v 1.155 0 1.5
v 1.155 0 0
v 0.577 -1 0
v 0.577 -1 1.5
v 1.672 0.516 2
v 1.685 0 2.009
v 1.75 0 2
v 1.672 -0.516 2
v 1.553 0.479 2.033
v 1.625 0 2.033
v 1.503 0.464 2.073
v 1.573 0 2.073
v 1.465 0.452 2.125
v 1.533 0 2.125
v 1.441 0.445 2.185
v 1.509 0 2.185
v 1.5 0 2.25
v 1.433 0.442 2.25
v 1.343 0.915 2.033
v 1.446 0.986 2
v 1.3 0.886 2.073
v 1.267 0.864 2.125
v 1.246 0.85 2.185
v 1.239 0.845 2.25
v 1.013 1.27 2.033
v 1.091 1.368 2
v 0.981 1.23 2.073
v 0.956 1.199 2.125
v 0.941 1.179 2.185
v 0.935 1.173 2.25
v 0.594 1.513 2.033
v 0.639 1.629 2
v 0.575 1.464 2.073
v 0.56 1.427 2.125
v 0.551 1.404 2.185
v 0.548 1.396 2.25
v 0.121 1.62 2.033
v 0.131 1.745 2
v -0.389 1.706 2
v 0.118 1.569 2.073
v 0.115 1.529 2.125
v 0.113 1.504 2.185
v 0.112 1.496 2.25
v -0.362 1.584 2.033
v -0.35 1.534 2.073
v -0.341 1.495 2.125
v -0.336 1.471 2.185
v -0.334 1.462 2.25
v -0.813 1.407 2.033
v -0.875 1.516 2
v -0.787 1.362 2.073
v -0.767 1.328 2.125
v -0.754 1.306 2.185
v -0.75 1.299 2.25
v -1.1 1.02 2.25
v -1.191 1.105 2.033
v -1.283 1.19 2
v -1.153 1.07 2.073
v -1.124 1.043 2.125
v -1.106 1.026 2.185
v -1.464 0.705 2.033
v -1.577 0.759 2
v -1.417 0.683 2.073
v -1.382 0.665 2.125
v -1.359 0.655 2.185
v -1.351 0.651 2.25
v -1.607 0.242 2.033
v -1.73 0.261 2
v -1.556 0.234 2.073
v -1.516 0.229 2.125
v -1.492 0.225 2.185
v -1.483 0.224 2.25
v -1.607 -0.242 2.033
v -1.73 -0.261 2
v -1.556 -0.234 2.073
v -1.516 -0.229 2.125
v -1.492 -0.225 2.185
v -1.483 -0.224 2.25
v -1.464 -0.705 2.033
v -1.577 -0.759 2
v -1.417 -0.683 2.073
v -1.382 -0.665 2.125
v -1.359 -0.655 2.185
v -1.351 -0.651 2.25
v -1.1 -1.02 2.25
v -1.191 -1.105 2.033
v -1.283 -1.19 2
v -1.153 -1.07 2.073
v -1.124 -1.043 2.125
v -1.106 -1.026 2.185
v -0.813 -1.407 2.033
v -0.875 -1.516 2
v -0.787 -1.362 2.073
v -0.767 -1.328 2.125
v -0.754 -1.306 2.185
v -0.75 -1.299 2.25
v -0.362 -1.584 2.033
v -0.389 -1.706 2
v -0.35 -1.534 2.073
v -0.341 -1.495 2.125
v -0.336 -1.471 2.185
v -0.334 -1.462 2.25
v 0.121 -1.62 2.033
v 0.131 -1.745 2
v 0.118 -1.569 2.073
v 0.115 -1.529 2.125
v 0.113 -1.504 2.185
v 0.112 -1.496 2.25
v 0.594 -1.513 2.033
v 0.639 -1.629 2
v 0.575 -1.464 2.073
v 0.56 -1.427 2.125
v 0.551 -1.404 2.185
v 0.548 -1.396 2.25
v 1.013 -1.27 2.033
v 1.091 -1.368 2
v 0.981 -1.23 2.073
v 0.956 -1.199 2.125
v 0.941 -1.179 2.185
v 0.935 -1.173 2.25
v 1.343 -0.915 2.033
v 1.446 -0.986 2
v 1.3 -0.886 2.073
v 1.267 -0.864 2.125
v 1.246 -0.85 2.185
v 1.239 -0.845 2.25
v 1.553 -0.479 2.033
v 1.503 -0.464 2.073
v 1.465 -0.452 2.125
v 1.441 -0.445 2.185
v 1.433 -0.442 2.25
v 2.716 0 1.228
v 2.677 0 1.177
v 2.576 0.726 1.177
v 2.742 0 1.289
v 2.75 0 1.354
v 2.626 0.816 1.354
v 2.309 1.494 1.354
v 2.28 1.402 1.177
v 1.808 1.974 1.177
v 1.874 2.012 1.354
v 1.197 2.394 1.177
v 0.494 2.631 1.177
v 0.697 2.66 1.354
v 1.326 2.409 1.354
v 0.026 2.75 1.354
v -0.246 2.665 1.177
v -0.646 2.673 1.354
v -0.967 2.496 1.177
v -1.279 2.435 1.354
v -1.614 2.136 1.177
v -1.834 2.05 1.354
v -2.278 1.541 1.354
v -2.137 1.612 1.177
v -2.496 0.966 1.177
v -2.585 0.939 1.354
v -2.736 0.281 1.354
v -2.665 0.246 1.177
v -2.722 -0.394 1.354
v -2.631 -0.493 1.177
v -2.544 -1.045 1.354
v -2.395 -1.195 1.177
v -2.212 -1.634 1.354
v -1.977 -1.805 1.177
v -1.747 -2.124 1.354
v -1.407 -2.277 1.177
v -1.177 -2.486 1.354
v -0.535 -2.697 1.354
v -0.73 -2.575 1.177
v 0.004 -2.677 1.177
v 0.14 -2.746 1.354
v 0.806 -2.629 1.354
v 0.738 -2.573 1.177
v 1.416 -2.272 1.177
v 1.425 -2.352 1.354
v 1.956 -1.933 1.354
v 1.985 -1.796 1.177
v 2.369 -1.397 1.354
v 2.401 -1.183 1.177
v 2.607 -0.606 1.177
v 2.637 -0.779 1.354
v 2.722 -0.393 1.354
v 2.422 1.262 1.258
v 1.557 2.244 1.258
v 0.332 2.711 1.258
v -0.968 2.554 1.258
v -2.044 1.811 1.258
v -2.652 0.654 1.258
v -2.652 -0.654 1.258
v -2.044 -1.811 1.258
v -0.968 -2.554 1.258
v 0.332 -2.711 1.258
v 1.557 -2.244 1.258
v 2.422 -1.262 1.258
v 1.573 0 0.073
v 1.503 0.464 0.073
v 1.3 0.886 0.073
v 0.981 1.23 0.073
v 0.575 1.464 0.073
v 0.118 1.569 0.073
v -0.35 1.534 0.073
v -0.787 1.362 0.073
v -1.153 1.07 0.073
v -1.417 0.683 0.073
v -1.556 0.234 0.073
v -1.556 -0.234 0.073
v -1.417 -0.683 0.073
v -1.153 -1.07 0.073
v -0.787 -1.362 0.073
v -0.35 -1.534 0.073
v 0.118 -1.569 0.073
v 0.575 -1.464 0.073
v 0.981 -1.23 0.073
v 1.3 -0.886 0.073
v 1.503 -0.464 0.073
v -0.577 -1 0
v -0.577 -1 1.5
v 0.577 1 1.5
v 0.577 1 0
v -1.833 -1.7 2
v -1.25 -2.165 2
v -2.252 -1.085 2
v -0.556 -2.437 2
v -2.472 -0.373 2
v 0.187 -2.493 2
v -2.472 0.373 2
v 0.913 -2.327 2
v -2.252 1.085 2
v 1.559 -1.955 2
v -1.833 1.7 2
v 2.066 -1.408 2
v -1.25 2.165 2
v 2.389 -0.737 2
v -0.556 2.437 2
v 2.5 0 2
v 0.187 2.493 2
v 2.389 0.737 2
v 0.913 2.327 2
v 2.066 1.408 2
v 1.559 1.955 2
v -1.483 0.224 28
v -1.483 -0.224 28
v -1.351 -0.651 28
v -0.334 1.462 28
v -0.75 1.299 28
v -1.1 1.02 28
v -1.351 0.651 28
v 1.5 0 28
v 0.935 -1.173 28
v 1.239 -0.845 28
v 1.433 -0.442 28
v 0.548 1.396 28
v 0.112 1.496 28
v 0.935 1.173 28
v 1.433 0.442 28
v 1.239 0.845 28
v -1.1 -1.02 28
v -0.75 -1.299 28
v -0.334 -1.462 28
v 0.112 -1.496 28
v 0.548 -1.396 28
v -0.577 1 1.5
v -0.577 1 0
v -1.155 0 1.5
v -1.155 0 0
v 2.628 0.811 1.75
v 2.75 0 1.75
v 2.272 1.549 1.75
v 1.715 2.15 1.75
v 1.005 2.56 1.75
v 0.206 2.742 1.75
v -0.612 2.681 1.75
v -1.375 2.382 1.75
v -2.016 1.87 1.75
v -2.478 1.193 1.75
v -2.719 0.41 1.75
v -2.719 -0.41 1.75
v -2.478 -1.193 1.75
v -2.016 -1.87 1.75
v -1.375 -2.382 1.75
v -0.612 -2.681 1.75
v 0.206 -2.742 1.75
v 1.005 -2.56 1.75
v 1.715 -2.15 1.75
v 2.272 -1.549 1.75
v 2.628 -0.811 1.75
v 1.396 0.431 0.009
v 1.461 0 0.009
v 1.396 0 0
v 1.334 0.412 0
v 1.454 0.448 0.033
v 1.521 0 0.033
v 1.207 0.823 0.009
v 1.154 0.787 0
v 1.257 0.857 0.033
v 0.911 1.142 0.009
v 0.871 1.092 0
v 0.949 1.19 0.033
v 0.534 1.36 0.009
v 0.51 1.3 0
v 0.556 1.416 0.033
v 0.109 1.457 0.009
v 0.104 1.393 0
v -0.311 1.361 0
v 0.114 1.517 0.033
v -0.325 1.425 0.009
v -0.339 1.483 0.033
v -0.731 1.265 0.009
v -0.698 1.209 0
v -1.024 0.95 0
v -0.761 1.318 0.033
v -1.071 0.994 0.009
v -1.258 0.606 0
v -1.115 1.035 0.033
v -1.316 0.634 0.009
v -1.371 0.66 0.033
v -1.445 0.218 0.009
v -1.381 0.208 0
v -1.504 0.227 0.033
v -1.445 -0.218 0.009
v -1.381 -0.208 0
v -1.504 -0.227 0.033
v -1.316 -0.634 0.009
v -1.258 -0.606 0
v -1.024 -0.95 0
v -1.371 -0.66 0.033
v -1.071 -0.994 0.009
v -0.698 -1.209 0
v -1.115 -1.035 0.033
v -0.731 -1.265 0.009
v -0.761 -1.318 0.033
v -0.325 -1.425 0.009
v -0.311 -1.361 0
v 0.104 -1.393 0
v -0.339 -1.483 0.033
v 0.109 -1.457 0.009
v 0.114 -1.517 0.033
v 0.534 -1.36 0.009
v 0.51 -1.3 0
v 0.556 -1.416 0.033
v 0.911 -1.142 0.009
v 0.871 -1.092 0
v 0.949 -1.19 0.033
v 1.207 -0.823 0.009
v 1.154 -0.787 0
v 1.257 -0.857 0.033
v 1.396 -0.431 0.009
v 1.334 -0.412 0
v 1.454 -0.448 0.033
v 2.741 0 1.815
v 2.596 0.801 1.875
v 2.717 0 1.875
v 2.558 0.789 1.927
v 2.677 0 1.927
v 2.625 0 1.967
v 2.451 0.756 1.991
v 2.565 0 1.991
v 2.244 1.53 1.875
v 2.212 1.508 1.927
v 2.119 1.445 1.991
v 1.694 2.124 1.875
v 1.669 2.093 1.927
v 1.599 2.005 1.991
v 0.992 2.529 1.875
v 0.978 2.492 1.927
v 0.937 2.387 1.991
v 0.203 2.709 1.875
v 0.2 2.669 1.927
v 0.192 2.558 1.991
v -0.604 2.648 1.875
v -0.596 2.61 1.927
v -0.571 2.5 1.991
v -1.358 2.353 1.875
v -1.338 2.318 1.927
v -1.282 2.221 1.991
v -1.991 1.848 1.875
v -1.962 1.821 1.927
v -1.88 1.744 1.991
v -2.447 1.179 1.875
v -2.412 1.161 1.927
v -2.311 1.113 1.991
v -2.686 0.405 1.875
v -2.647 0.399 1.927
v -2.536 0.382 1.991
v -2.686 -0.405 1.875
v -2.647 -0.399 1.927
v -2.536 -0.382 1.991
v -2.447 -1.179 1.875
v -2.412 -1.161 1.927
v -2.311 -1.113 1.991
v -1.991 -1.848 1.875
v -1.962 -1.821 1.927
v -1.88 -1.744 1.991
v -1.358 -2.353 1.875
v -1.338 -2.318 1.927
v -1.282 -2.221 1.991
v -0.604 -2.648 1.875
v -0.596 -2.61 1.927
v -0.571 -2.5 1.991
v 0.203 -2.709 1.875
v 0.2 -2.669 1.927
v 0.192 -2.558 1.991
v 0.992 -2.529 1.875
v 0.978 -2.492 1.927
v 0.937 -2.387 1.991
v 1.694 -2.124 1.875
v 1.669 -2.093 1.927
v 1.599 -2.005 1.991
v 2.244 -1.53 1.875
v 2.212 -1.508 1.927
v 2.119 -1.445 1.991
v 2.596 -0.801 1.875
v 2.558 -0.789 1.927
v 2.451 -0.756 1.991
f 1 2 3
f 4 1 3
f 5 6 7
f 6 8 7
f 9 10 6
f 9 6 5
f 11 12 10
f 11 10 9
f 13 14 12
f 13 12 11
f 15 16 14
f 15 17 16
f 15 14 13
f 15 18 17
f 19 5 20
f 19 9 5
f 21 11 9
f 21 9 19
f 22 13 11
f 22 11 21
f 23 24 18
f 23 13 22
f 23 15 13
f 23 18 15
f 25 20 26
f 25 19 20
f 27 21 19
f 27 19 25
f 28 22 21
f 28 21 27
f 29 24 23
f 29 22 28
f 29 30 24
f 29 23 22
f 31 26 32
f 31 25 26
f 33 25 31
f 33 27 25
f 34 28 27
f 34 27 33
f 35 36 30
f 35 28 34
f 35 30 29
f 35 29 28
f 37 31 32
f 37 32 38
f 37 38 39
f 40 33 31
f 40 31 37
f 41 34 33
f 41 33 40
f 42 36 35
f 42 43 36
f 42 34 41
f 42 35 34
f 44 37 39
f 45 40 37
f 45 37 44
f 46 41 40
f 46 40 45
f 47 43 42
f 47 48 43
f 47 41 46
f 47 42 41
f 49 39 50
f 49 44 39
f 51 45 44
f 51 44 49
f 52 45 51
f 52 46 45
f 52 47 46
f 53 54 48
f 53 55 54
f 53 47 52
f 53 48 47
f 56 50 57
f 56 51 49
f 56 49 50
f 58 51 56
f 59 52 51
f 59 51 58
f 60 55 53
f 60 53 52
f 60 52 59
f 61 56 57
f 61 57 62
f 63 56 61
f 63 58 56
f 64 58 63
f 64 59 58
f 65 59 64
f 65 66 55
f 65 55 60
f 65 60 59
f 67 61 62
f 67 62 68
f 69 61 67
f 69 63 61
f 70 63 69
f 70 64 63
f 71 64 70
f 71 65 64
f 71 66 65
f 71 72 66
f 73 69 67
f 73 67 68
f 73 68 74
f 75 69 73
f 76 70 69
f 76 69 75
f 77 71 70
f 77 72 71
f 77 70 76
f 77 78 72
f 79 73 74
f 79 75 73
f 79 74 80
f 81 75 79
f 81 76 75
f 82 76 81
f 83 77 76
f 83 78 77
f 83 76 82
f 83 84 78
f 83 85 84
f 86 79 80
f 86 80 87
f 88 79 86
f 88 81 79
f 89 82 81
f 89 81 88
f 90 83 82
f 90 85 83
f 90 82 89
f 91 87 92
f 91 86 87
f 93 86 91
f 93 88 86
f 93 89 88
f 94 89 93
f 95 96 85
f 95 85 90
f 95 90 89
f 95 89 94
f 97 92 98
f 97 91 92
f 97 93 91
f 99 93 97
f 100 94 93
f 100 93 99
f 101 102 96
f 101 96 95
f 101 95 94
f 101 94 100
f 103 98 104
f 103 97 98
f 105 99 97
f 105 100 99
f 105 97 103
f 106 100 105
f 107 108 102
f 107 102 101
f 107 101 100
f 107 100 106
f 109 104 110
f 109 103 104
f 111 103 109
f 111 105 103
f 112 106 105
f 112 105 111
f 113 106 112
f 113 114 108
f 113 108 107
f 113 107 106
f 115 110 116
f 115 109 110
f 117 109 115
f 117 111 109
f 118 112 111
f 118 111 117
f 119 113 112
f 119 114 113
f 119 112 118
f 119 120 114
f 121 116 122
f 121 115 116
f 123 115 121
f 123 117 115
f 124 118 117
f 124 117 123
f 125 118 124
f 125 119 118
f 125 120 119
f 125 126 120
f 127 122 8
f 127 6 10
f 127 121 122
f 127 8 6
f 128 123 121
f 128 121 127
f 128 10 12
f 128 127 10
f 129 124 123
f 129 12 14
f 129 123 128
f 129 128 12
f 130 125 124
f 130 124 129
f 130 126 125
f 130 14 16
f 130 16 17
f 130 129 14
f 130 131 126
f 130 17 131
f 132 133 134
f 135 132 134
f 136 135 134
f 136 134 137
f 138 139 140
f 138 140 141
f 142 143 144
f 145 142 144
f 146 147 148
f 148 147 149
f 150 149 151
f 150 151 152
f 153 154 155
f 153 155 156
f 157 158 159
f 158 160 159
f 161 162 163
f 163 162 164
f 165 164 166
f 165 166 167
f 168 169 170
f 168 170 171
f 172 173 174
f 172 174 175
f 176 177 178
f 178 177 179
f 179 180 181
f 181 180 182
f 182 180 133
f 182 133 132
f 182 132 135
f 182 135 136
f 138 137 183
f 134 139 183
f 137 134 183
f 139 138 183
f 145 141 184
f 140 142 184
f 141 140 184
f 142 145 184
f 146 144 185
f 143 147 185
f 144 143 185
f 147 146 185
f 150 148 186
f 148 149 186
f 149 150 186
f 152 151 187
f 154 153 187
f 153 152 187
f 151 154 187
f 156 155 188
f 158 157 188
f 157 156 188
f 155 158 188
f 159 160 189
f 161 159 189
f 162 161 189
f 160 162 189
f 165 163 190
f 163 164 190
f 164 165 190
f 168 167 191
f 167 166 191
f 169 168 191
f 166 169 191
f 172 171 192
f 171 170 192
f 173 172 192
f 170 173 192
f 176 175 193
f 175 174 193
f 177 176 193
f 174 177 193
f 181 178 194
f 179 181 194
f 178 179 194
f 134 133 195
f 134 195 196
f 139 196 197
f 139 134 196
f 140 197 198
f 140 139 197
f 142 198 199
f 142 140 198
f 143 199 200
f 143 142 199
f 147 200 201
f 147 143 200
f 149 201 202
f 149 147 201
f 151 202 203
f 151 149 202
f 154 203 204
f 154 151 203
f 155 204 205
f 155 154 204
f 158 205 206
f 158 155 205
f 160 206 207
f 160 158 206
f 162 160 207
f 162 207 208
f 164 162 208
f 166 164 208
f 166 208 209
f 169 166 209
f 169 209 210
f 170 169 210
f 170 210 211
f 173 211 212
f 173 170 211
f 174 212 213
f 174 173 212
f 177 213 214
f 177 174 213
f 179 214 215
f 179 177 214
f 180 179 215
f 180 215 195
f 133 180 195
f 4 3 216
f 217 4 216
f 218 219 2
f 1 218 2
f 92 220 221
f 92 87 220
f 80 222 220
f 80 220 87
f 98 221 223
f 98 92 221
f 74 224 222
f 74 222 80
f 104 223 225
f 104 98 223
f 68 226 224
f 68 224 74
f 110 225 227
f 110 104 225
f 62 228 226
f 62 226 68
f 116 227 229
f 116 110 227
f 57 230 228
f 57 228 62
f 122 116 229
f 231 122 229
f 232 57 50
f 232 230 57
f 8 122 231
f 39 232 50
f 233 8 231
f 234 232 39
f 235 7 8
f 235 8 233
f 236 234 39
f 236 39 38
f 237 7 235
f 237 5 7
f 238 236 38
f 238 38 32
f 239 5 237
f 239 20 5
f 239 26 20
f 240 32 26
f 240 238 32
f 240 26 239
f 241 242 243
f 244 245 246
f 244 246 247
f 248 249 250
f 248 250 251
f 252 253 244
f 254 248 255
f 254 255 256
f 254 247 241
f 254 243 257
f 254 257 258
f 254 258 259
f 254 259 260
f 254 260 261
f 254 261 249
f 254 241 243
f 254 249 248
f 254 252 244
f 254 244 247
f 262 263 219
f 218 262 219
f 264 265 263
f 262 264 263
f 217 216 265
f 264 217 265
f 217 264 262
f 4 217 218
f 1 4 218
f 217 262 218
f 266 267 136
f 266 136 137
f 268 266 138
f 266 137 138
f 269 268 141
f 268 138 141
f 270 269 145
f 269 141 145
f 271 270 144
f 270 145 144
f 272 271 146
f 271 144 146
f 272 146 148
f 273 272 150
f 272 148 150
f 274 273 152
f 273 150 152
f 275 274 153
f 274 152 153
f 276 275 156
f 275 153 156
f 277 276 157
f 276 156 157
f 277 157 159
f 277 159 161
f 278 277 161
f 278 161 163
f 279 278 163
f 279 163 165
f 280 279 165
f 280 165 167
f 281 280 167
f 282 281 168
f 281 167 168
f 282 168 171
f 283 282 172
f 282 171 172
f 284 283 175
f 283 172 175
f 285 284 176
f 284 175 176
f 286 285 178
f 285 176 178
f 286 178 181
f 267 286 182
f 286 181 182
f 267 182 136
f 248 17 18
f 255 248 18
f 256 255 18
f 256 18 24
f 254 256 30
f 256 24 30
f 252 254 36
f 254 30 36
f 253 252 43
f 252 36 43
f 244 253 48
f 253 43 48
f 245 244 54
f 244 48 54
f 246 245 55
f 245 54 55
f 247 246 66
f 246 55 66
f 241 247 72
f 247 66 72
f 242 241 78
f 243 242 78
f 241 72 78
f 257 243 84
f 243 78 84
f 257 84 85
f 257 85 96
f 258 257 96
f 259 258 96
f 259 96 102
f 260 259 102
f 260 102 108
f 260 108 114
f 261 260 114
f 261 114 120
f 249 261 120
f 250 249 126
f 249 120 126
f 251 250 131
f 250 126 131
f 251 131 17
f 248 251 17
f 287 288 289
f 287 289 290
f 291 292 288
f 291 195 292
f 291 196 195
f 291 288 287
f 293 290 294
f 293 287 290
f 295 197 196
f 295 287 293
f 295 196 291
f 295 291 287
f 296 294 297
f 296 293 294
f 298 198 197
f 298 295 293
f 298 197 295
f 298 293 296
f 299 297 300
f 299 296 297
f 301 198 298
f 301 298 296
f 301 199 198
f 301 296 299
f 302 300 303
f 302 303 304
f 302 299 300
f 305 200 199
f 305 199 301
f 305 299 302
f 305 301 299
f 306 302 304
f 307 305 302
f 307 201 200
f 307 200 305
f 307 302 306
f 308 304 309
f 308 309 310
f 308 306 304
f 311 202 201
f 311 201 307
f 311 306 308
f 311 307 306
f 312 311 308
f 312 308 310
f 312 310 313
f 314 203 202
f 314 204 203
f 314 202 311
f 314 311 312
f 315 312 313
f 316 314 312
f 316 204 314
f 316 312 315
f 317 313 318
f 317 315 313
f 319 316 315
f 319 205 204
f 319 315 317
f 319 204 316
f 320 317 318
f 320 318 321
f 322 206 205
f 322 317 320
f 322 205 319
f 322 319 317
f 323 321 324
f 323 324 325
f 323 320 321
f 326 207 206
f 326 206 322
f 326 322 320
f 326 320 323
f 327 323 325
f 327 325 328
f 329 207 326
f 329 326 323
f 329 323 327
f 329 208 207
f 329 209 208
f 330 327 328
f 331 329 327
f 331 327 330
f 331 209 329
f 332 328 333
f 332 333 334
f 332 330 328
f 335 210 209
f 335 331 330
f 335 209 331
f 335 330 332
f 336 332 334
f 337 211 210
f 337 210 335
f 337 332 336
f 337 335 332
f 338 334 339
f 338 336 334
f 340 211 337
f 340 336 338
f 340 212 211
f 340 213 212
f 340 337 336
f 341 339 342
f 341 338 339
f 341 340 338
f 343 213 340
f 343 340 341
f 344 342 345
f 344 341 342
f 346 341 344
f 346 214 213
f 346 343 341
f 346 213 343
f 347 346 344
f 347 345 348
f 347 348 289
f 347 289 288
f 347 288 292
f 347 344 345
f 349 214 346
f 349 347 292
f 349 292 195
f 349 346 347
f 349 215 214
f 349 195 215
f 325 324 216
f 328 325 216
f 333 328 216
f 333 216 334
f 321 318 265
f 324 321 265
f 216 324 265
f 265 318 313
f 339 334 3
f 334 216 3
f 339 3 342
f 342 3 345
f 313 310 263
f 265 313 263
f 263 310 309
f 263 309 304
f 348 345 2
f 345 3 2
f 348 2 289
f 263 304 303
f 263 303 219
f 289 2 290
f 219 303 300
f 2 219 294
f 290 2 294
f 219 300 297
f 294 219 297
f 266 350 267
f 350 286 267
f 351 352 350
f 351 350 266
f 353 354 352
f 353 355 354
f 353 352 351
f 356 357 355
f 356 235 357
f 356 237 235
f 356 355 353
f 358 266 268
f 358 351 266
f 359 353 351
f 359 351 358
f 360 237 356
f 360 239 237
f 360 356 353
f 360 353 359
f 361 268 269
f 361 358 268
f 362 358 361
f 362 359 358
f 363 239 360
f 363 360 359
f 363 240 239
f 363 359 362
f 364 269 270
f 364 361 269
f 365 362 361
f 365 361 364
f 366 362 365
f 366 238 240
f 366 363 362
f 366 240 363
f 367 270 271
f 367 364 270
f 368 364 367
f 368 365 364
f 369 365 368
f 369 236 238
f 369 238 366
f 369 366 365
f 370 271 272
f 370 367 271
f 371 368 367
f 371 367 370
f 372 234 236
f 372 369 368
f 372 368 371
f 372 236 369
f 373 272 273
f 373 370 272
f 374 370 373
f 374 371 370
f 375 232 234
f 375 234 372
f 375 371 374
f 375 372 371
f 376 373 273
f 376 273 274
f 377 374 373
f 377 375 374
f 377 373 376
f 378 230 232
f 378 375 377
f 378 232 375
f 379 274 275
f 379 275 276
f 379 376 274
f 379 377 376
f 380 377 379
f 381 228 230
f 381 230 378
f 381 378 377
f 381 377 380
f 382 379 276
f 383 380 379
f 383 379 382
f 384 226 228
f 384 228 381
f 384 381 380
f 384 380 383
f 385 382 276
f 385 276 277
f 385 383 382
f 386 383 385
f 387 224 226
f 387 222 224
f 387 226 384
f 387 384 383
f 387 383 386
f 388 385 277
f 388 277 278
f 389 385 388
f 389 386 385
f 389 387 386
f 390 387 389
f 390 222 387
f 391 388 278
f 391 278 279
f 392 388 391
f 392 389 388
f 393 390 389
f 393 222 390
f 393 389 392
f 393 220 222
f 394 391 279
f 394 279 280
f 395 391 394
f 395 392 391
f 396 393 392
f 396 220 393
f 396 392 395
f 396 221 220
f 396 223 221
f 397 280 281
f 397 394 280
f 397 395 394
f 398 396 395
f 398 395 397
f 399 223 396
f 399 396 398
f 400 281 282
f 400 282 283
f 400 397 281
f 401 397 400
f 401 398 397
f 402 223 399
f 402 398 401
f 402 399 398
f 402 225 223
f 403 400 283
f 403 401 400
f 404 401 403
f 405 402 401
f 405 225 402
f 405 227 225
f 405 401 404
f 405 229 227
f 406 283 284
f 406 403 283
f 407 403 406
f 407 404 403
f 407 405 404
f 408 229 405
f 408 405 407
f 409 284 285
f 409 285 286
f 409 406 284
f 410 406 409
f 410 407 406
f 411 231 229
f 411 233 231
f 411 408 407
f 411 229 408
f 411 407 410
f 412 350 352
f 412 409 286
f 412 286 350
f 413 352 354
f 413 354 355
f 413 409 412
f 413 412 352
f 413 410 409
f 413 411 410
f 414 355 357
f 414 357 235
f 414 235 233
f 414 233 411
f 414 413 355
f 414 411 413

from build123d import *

# Parameters (mm, degrees)
F1_R     = 2.75
F1_R_2   = 1.5
F2_DEPTH = 2
F3_START = 1.5
F3_DEPTH = 0.5
F4_START = 2
F4_DEPTH = 26
F5_SIZE2 = 1.25
F5_SIZE  = 1.25
F6_R     = 0.25


# Not quite as in the source:
# - a feature names something its author has since deleted; it is built from what else it names


with BuildPart() as f2:
    # F1 (on Top) → F2 (new body)
    with BuildSketch(Plane.XY):
        Circle(F1_R)
        Circle(F1_R_2, mode=Mode.SUBTRACT)
        Circle(F1_R_2)
        Polygon((-0.5773502692, -1), (-1.1547005384, 0), (-0.5773502692, 1), (0.5773502692, 1), (1.1547005384, 0), (0.5773502692, -1), align=None, mode=Mode.SUBTRACT)
    extrude(amount=F2_DEPTH)

    # F1 (on Top) → F3 (join)
    with BuildSketch(Plane.XY.offset(F3_START)):
        Polygon((-0.5773502692, 1), (-1.1547005384, 0), (-0.5773502692, -1), (0.5773502692, -1), (1.1547005384, 0), (0.5773502692, 1), align=None)
    extrude(amount=F3_DEPTH)

    # F1 (on Top) → F4 (join)
    with BuildSketch(Plane.XY.offset(F4_START)):
        Circle(F1_R_2)
        Polygon((-0.5773502692, -1), (-1.1547005384, 0), (-0.5773502692, 1), (0.5773502692, 1), (1.1547005384, 0), (0.5773502692, -1), align=None, mode=Mode.SUBTRACT)
        Polygon((-0.5773502692, 1), (-1.1547005384, 0), (-0.5773502692, -1), (0.5773502692, -1), (1.1547005384, 0), (0.5773502692, 1), align=None)
    extrude(amount=F4_DEPTH)

    # F5
    f5_edges = [f2.edges().sort_by_distance(p)[0] for p in [
        (-2.75, 0, 0),
    ]]
    chamfer(f5_edges, length=F5_SIZE, length2=F5_SIZE2)

    # F6
    f6_edges = [f2.edges().sort_by_distance(p)[0] for p in [
        (-2.75, 0, 2),
        (-1.5, 0, 2),
        (-1.5, 0, 0),
        (-2.75, 0, 1.25),
    ]]
    fillet(f6_edges, radius=F6_R)


solid = f2.part
